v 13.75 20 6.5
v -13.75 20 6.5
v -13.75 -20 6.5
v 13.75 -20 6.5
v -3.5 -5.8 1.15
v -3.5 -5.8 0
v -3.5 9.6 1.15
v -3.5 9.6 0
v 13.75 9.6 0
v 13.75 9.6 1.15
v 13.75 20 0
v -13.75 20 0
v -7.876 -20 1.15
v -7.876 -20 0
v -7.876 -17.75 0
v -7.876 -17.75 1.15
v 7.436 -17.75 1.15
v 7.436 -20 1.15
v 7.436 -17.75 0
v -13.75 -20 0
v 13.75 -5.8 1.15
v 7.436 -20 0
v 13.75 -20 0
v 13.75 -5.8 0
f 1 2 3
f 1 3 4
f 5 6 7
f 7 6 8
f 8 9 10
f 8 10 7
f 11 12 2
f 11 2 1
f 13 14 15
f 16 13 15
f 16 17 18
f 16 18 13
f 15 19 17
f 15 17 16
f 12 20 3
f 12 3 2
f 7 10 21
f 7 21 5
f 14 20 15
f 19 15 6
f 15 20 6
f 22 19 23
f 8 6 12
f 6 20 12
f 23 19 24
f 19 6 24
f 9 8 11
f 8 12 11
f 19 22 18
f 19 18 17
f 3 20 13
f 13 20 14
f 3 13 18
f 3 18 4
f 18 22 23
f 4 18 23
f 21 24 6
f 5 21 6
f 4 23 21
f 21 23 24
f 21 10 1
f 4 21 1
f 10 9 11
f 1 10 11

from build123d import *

# Parameters (mm, degrees)
SKETCH1_W           = 27.5
SKETCH1_H           = 40
BOSS_EXTRUDE1_DEPTH = 6.5
SKETCH2_W           = 17.25
SKETCH2_H           = 15.4
CUT_EXTRUDE1_DEPTH  = 1.15
SKETCH3_W           = 15.312161922
SKETCH3_H           = 2.25
CUT_EXTRUDE2_DEPTH  = 1.15


with BuildPart() as part:
    # Sketch1 → Boss-Extrude1 (new body)
    with BuildSketch(Plane.XY):
        Rectangle(SKETCH1_W, SKETCH1_H)
    extrude(amount=BOSS_EXTRUDE1_DEPTH)

    # Sketch2 → Cut-Extrude1 (cut)
    with BuildSketch(Plane(origin=(0, 0, 0), x_dir=(-1, 0, 0), z_dir=(0, 0, -1))):
        with Locations((-5.125, 1.9)):
            Rectangle(SKETCH2_W, SKETCH2_H)
    extrude(amount=-CUT_EXTRUDE1_DEPTH, mode=Mode.SUBTRACT)

    # Sketch3 → Cut-Extrude2 (cut)
    with BuildSketch(Plane(origin=(0, 0, 0), x_dir=(-1, 0, 0), z_dir=(0, 0, -1))):
        with Locations((0.219698945, -18.875)):
            Rectangle(SKETCH3_W, SKETCH3_H)
    extrude(amount=-CUT_EXTRUDE2_DEPTH, mode=Mode.SUBTRACT)


solid = part.part
